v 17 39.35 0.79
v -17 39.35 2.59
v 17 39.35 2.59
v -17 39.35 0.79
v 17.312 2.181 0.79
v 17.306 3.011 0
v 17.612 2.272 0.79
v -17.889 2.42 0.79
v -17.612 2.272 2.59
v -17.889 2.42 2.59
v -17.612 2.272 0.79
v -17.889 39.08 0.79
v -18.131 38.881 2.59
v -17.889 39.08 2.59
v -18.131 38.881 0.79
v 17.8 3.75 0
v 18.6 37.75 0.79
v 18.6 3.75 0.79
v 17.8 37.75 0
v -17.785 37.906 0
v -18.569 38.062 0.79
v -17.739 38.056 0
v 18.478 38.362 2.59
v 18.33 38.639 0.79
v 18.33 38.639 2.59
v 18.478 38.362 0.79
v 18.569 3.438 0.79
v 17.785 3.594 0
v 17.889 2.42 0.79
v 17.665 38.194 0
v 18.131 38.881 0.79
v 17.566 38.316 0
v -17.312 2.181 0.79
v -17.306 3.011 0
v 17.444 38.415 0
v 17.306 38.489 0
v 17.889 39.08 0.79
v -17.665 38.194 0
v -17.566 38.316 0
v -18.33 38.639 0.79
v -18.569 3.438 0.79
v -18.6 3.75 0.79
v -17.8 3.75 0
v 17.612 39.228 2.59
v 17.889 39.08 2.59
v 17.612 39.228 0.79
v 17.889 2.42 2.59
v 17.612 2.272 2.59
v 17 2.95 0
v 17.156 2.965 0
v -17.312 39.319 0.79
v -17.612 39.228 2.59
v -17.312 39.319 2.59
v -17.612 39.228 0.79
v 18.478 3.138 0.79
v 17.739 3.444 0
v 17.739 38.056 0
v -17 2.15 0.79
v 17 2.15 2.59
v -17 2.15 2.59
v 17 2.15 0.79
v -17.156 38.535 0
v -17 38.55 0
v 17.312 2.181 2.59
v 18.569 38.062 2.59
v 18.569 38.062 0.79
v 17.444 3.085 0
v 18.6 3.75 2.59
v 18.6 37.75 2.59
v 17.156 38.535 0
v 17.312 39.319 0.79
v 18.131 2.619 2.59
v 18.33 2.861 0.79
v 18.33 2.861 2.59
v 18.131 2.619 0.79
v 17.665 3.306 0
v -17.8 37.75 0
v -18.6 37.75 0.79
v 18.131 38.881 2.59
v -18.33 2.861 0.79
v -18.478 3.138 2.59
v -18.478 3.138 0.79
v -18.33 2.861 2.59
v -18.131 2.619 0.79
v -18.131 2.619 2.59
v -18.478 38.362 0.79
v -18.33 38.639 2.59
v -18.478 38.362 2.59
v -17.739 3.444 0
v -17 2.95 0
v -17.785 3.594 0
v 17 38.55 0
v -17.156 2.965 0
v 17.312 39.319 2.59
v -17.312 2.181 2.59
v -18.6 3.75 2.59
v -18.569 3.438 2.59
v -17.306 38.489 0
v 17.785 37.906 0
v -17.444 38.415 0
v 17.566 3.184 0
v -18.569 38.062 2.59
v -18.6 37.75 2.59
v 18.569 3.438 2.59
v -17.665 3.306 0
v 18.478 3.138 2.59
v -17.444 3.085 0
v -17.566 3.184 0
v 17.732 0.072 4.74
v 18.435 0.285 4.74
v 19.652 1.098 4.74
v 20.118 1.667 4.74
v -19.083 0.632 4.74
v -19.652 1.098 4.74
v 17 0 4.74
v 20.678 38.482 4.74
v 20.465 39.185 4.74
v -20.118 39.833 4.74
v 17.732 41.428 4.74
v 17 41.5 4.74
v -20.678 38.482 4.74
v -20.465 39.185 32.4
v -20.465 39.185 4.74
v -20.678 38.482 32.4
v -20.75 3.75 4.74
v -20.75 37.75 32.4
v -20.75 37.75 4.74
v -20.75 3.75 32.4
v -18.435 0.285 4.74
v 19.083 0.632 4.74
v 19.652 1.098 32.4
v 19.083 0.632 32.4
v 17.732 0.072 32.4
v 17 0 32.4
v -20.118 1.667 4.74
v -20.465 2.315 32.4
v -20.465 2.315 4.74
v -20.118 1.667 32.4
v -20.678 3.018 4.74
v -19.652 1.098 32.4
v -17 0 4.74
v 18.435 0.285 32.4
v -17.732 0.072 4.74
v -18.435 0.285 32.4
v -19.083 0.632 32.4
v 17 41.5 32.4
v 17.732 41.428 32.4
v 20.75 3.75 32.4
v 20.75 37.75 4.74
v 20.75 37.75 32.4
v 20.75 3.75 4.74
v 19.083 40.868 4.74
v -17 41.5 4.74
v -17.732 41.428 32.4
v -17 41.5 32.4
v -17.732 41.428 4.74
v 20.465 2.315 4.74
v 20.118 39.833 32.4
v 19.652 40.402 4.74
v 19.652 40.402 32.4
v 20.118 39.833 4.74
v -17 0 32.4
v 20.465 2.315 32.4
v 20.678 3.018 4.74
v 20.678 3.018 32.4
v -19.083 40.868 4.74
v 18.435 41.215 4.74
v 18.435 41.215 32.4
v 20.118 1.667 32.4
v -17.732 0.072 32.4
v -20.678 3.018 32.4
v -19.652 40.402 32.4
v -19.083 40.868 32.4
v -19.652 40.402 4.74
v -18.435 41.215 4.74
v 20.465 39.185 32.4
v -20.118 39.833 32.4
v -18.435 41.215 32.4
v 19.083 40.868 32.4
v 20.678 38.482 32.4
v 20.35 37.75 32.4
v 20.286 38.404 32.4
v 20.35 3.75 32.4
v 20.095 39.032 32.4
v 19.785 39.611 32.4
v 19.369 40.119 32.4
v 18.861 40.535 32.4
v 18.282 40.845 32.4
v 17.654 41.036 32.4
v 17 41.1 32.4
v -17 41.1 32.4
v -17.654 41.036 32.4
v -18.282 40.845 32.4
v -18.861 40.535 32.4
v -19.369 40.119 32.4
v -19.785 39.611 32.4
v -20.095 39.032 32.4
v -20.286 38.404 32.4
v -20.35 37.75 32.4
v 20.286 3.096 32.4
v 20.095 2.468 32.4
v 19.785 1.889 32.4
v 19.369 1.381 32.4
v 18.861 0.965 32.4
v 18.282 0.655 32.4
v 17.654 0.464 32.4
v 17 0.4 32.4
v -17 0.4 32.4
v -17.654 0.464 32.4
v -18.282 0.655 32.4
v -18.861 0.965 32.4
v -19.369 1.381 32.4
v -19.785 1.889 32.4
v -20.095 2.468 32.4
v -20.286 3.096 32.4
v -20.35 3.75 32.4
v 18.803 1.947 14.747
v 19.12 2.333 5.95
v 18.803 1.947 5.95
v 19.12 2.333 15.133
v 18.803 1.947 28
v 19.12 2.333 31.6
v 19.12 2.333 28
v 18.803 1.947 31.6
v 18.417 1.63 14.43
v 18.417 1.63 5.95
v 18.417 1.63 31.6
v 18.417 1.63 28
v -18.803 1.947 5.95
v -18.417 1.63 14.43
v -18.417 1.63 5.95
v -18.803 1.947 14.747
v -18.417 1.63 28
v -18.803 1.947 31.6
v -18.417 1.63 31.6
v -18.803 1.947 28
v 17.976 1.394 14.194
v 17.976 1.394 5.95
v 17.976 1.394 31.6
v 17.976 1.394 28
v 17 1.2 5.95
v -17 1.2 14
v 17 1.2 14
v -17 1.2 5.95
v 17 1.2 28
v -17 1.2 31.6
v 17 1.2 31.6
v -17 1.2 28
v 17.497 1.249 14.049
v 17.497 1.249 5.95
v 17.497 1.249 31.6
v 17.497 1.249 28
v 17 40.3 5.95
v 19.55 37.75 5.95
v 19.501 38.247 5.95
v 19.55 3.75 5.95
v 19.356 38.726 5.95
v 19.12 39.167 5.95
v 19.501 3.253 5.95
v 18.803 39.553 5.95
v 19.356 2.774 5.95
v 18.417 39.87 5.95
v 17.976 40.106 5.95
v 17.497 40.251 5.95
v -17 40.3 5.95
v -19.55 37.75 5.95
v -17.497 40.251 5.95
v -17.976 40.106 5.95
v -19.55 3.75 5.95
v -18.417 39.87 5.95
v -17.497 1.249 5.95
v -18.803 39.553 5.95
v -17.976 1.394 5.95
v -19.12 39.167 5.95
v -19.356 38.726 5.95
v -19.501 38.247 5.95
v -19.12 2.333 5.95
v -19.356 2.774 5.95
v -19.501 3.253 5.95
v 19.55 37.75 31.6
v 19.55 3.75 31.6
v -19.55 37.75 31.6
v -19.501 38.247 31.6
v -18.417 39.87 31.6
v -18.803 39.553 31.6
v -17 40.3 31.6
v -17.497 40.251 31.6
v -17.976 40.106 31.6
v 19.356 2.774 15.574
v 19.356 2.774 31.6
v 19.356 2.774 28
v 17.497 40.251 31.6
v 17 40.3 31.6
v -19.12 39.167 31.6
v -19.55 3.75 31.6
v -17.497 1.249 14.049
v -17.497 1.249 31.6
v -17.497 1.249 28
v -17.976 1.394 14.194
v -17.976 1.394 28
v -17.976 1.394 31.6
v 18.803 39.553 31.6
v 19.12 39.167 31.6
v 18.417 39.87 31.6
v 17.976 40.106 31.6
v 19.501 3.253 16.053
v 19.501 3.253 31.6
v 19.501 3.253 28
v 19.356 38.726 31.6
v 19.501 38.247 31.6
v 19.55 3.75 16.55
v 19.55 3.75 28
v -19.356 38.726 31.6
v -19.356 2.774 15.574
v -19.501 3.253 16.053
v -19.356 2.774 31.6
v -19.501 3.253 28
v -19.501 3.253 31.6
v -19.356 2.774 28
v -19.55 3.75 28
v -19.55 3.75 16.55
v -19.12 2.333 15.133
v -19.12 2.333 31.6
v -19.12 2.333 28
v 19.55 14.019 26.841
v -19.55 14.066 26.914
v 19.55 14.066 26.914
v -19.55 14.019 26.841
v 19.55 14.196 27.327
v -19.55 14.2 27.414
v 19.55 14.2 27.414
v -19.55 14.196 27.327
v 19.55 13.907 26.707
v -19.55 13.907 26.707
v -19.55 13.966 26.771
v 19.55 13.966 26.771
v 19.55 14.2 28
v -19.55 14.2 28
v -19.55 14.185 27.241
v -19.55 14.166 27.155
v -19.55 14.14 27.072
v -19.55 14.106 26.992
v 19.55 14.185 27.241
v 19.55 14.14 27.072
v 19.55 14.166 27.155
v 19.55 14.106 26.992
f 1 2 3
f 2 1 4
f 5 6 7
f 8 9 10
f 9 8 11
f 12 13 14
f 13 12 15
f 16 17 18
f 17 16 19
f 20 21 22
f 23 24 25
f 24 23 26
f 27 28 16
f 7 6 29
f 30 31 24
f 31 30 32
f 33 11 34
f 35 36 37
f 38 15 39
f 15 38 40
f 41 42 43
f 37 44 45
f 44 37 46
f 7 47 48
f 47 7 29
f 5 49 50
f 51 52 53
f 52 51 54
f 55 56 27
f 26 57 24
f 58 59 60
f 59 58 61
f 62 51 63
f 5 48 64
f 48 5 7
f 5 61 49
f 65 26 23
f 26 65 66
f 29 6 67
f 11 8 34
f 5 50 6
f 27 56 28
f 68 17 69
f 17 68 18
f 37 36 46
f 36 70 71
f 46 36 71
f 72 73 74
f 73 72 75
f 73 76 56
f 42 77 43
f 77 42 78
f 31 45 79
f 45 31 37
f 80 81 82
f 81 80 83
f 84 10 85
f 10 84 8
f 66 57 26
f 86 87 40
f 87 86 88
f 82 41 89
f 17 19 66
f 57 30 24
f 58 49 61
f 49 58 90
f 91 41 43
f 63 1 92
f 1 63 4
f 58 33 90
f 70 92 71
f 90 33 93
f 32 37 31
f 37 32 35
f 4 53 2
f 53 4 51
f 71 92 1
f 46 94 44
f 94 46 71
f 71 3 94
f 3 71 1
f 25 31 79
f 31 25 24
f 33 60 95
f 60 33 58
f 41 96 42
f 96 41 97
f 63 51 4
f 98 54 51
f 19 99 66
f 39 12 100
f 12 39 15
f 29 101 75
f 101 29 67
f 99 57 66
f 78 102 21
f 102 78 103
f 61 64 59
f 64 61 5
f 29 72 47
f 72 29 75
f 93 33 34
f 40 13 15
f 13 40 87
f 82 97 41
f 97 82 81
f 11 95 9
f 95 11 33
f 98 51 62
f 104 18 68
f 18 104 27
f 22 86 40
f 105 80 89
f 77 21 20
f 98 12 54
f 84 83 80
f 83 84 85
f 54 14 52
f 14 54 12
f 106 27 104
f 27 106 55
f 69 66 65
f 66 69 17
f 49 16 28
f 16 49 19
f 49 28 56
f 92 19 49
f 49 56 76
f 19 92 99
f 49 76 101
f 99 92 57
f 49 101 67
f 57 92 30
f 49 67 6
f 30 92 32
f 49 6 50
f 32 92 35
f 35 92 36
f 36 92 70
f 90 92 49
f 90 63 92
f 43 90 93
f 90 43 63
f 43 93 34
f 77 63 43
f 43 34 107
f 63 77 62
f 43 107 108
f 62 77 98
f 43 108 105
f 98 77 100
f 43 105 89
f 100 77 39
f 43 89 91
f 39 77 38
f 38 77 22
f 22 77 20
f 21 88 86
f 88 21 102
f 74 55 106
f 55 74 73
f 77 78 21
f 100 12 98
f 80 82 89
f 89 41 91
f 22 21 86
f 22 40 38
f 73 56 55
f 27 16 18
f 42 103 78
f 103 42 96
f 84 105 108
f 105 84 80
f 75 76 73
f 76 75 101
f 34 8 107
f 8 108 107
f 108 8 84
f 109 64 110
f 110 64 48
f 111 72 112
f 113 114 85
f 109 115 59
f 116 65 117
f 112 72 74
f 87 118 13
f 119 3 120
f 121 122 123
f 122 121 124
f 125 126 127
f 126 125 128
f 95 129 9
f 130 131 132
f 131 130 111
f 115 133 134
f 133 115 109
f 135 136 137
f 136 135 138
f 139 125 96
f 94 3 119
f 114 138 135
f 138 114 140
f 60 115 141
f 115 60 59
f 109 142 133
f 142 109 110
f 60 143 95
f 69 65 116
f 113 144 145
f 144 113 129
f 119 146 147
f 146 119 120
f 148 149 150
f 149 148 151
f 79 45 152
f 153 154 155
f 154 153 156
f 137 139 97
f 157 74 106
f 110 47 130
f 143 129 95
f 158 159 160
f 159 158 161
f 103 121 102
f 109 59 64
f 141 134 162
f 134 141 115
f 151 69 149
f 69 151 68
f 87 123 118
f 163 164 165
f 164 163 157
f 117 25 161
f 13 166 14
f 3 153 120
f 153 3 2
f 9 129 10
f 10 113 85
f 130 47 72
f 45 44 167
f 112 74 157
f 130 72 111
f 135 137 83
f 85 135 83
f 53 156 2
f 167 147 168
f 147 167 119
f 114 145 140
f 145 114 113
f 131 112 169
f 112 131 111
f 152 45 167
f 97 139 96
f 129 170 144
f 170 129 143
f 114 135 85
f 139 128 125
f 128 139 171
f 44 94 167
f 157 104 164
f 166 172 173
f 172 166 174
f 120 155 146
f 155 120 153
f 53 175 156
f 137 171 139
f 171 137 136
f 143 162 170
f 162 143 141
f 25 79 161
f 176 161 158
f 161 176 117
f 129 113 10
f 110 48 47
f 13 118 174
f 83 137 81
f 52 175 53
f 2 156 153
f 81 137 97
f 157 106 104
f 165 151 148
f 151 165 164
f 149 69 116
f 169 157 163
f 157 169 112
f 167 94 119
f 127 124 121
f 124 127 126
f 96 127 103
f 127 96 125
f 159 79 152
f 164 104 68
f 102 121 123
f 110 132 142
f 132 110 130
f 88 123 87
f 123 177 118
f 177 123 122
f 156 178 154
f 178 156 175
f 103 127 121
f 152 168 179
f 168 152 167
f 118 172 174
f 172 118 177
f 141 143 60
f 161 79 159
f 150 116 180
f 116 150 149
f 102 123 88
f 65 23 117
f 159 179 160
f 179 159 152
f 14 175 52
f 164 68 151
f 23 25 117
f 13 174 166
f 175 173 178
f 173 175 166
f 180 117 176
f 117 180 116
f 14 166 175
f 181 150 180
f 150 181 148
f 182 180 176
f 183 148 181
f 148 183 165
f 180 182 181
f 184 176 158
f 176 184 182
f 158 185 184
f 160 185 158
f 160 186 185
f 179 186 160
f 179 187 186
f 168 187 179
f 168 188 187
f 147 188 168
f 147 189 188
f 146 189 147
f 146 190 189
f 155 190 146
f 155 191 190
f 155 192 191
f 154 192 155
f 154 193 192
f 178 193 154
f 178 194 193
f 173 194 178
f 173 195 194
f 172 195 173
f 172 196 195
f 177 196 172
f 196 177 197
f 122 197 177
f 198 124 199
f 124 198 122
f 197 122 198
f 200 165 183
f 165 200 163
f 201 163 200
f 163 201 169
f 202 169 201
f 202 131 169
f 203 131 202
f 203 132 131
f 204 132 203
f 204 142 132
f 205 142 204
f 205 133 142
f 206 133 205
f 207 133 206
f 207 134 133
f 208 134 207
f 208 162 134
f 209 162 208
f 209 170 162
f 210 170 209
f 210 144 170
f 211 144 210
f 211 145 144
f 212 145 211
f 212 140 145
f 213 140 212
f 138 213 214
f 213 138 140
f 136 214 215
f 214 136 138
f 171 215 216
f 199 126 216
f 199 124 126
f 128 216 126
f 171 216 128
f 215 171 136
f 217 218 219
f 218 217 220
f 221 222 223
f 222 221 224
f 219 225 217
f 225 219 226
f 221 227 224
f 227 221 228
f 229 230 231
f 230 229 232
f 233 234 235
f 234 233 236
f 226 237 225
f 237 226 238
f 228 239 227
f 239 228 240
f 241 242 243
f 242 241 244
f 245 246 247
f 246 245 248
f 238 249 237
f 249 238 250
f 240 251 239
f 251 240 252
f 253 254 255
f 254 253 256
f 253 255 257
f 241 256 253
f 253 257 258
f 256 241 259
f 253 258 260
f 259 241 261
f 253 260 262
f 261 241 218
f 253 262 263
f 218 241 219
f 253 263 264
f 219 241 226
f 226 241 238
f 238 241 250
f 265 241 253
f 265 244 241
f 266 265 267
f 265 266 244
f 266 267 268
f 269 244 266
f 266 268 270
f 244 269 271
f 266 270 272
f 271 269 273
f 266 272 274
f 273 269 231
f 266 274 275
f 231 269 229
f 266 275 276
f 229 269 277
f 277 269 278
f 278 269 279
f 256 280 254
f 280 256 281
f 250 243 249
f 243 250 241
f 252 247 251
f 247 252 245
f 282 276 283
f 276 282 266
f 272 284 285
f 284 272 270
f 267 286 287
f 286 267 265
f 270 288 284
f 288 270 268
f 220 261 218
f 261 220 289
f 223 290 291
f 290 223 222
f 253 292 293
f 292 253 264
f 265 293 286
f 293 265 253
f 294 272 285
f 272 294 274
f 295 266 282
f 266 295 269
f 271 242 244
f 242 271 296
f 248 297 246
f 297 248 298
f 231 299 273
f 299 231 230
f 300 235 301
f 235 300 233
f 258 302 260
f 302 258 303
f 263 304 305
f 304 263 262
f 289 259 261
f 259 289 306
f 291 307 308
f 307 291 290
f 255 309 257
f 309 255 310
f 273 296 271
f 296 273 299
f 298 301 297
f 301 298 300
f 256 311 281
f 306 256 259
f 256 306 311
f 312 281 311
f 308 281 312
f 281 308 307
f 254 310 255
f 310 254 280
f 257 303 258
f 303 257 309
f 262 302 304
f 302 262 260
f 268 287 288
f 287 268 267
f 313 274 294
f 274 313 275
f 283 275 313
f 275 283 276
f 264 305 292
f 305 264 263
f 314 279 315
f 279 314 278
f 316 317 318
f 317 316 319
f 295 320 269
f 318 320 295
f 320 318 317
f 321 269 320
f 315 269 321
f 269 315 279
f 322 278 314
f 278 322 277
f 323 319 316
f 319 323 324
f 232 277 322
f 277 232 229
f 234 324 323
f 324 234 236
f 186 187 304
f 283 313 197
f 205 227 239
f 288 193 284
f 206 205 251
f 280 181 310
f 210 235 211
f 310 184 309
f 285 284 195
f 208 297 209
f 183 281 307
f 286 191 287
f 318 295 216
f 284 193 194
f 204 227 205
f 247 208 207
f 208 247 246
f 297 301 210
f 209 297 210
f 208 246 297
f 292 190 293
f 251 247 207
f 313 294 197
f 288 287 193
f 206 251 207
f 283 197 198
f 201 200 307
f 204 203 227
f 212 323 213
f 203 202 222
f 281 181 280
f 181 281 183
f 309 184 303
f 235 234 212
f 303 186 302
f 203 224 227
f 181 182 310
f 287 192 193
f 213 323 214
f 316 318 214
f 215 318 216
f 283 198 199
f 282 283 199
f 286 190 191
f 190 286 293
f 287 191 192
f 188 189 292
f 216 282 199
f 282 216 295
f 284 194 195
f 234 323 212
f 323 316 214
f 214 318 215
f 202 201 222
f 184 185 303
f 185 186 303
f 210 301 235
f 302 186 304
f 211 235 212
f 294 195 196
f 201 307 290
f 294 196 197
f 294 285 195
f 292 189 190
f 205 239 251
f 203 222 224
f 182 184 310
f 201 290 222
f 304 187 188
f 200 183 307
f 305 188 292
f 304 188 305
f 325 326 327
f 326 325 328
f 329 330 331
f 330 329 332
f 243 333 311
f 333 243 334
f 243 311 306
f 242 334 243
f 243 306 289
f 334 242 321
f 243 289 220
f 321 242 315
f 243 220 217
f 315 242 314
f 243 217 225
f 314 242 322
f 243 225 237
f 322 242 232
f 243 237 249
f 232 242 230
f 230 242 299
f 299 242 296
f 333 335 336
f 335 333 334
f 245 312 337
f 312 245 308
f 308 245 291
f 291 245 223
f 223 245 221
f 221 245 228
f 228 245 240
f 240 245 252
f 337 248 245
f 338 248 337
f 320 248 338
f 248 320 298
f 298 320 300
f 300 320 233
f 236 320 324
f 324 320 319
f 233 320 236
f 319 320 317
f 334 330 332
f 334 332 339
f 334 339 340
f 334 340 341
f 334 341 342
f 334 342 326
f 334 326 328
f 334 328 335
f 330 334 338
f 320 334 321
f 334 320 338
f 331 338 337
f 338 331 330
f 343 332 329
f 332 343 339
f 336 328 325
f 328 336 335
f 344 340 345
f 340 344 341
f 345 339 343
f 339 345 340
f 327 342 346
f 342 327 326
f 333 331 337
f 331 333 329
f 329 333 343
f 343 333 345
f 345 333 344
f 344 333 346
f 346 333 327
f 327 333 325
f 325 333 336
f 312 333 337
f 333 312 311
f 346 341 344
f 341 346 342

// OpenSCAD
// file: ../../modules/gridfinity.scad
// Gridfinity ベースプレートの共有 module。
// 寸法は Gridfinity 仕様 (Zack Freedman) の baseplate 輪郭に従う:
//   ピッチ 42、ソケット上端開口 41.5 (角 R4)、上から 45° 面取り 2.15 →
//   垂直 1.8 (37.2 角・R1.85) → 45° 面取り 0.7 → 底 35.8 角 (R1.15)。
//   ソケット深さ = 2.15 + 1.8 + 0.7 = 4.65。
//
// 座標系: X が列方向 (中央が 0)、Y が行方向 (板の前端が 0)、Z=0 が板の底面。
// 板の外形は grid とは独立に rim で与えるので、grid より大きい板 (縁付き) を
// 作れる。ソケットは rim=[left, right, front, back] の内側へ 42 ピッチで並ぶ。

gf_pitch = 42;
gf_socket_top = 41.5; // 上端開口
gf_socket_mid = 37.2; // 垂直部
gf_socket_bot = 35.8; // 底
gf_socket_r_top = 4;
gf_socket_r_mid = 1.85;
gf_socket_r_bot = 1.15;
gf_chamfer_top = 2.15;
gf_wall_h = 1.8;
gf_chamfer_bot = 0.7;
gf_socket_depth = gf_chamfer_top + gf_wall_h + gf_chamfer_bot; // 4.65
gf_fn = 32;
gf_eps = 0.01; // hull 用の薄板の厚さ
gf_over = 0.5; // 切削の抜き代

// 角丸正方形 (一辺 w、角 R)
module
gf_rounded_square(w, r)
{
    offset(r = r, $fn = gf_fn) square(w - 2 * r, center = true);
}

// 厚さ gf_eps の角丸正方形の薄板を z に置く (hull の骨)
module
gf_slab(w, r, z)
{
    translate([ 0, 0, z ]) linear_extrude(gf_eps) gf_rounded_square(w, r);
}

// ソケット1個の切削体。z=0 がソケットの底 (床の天面)、+Z へ 4.65 で天面に出る。
// clearance は嵌合の逃げで、輪郭を全周へ clearance だけ外へ出す (幅 +2c、角 R
// +c)。 既定 0 が Gridfinity の公称輪郭。深さとピッチは変えない
module
gf_socket_cut(clearance = 0)
{
    z1 = gf_chamfer_bot;
    z2 = z1 + gf_wall_h;
    z3 = gf_socket_depth;
    c = clearance;
    hull()
    {
        gf_slab(gf_socket_bot + 2 * c, gf_socket_r_bot + c, 0);
        gf_slab(gf_socket_mid + 2 * c, gf_socket_r_mid + c, z1 - gf_eps);
    }
    hull()
    {
        gf_slab(gf_socket_mid + 2 * c, gf_socket_r_mid + c, z1 - gf_eps);
        gf_slab(gf_socket_mid + 2 * c, gf_socket_r_mid + c, z2 - gf_eps);
    }
    hull()
    {
        gf_slab(gf_socket_mid + 2 * c, gf_socket_r_mid + c, z2 - gf_eps);
        gf_slab(gf_socket_top + 2 * c, gf_socket_r_top + c, z3 - gf_eps);
    }
    // 天面より上へ抜く (天面と同一平面の退化した面を残さない)
    gf_slab(gf_socket_top + 2 * c, gf_socket_r_top + c, z3 - gf_eps);
    translate([ 0, 0, z3 - gf_eps ]) linear_extrude(gf_over + gf_eps)
        gf_rounded_square(gf_socket_top + 2 * c, gf_socket_r_top + c);
}

// ベースプレート。cols x rows のソケットを床 floor_t の上に彫る。
// rim = [left, right, front, back] はソケット列の外側に残す縁の幅。
// 板の幅 = cols*42 + left + right、奥行き = rows*42 + front + back。
// clearance はソケットの嵌合の逃げ (gf_socket_cut を参照)。
module
gf_baseplate(cols, rows, rim = [ 0, 0, 0, 0 ], floor_t = 1, clearance = 0)
{
    grid_w = cols * gf_pitch;
    grid_d = rows * gf_pitch;
    plate_w = grid_w + rim[0] + rim[1];
    plate_d = grid_d + rim[2] + rim[3];
    x0 = -plate_w / 2 + rim[0]; // ソケット列の左端
    difference()
    {
        translate([ -plate_w / 2, 0, 0 ])
            cube([ plate_w, plate_d, floor_t + gf_socket_depth ]);
        for (c = [0:cols - 1], r = [0:rows - 1])
            translate([
                x0 + (c + 0.5) * gf_pitch,
                rim[2] + (r + 0.5) * gf_pitch,
                floor_t
            ]) gf_socket_cut(clearance);
    }
}
// file: ../../modules/gridfinity_bin.scad
include <gridfinity.scad>

// Gridfinity bin (箱) の共有 module。ピッチと角丸は gridfinity.scad
// と共有する。 底の輪郭は Gridfinity 仕様の bin base (下から):
//   35.6 角 (R0.8) → 45° 0.8 → 37.2 角 (R1.6) → 垂直 1.8 → 45° 2.15 → 41.5 角
//   (R3.75) 高さ 0.8 + 1.8 + 2.15 = 4.75。磁石穴・ネジ穴は持たない (無垢)
// 外形はピッチ − 0.5 (1 マス 41.5)、角 R3.75。高さ単位 7 (4U = 28 が壁の上端)。
// リップは「薄いリップ」: 壁 (1.2) をそのまま lip_h (4.4) 伸ばし、内側の上端を
// 45° に落とすだけ。内側に棚 (厚い肉) を持たないので、上に載せる bin は底の
// 面取りをこの 45° に座らせる。
//
// 座標系: X が列方向 (中央 0)、Y が行方向 (手前 = ラベル側が 0)、Z=0 が底面。

gfb_outer = gf_pitch - 0.5; // 41.5
gfb_outer_r = 3.75;
gfb_base_bot = 35.6;
gfb_base_bot_r = 0.8;
gfb_base_mid = 37.2;
gfb_base_mid_r = 1.6;
gfb_base_chamfer_bot = 0.8;
gfb_base_wall_h = 1.8;
gfb_base_chamfer_top = 2.15;
gfb_base_h =
    gfb_base_chamfer_bot + gfb_base_wall_h + gfb_base_chamfer_top; // 4.75
gfb_unit = 7;
gfb_lip_h = 4.4;
gfb_lip_chamfer = 0.8;

// bin 1 マスぶんの底 (無垢)。z=0 が底面、gfb_base_h で外形 41.5 角に達する
module
gfb_base_cell()
{
    z1 = gfb_base_chamfer_bot;
    z2 = z1 + gfb_base_wall_h;
    z3 = gfb_base_h;
    hull()
    {
        gf_slab(gfb_base_bot, gfb_base_bot_r, 0);
        gf_slab(gfb_base_mid, gfb_base_mid_r, z1 - gf_eps);
    }
    hull()
    {
        gf_slab(gfb_base_mid, gfb_base_mid_r, z1 - gf_eps);
        gf_slab(gfb_base_mid, gfb_base_mid_r, z2 - gf_eps);
    }
    hull()
    {
        gf_slab(gfb_base_mid, gfb_base_mid_r, z2 - gf_eps);
        gf_slab(gfb_outer, gfb_outer_r, z3 - gf_eps);
    }
}

// cols x rows の角丸矩形 (外形)
module
gfb_footprint(cols, rows, inset = 0)
{
    w = cols * gf_pitch - 0.5 - 2 * inset;
    d = rows * gf_pitch - 0.5 - 2 * inset;
    translate([ 0, d / 2 + inset ])
        gf_rounded_square_wd(w, d, gfb_outer_r - inset);
}

// 幅 w × 奥行き d の角丸矩形 (中心が原点)
module
gf_rounded_square_wd(w, d, r)
{
    offset(r = r, $fn = gf_fn) square([ w - 2 * r, d - 2 * r ], center = true);
}

// ラベル天板の Y-Z 断面 (y = 壁の内面からの距離、z = 高さ)。天板 (厚さ t) の
// 先端から 45° の斜面が壁まで下りる無垢のくさび。先端の垂直面と斜面の境目
// (135°) を半径 r で丸める: 円弧の中心は先端の角から (-r, r·tan22.5°)、接点は
// 垂直面上の角 + (0, r·tan22.5°) と斜面上の角 + 0.4142r·(-1,-1)。壁の内側へ
// 1 だけ食い込ませて胴体と溶かす
function gfb_label_profile(d, t, h, r) =
    let(y0 = d, z0 = h - t, cy = y0 - r, cz = z0 + r * tan(22.5))
        concat([ [ -1, h ], [ d, h ] ],
               [for (a = [0:-5:-45])[cy + r * cos(a), cz + r* sin(a)]],
               [[ -1, h - t - d - 1 ]]);

// bin 本体。units は高さ (U)。wall / floor_t は壁と床の厚さ。
// label_d > 0 なら手前 (y=0) の壁の上端 (z = units*7) と面一で内側へ label_d
// 張り出す厚さ label_t のラベル天板を付ける。天板の下は 45° の無垢のくさびが
// 壁まで下りる (ブリッジもリブも無い。中身はスライサのインフィル任せ)。
// 天板の先端と 45° 面の境目は半径 label_r で丸める
module
gfb_bin(cols,
        rows,
        units = 4,
        wall = 1.2,
        floor_t = 1.2,
        label_d = 0,
        label_t = 1,
        label_r = 1)
{
    h = units * gfb_unit; // 壁の上端
    top = h + gfb_lip_h;  // リップの上端
    inner_w = cols * gf_pitch - 0.5 - 2 * wall;
    floor_top = gfb_base_h + floor_t;
    union()
    {
        // 底: マスごとの無垢の base
        for (c = [0:cols - 1], r = [0:rows - 1])
            translate([
                (c - (cols - 1) / 2) * gf_pitch,
                (r + 0.5) * gf_pitch - 0.25,
                0
            ]) gfb_base_cell();
        // 胴体: base の上から top
        // まで。内側は床の上を抜く。リップの内側の上端は 45°
        difference()
        {
            translate([ 0, 0, gfb_base_h - gf_eps ])
                linear_extrude(top - gfb_base_h + gf_eps)
                    gfb_footprint(cols, rows);
            translate([ 0, 0, floor_top ])
                linear_extrude(top - floor_top + gf_over)
                    gfb_footprint(cols, rows, wall);
            // リップ内側の面取り: 上端で wall − 0.4 まで開く
            hull()
            {
                translate([ 0, 0, top - gfb_lip_chamfer ])
                    linear_extrude(gf_eps) gfb_footprint(cols, rows, wall);
                translate([ 0, 0, top ]) linear_extrude(gf_over)
                    gfb_footprint(cols, rows, wall - gfb_lip_chamfer);
            }
        }
        // ラベル天板と 45° くさび (内幅いっぱい、同じ断面)。壁へ 1 食い込ませた
        // 矩形の柱なので、角の丸み (R3.75) の外へ出ないよう外形で切り取る
        if (label_d > 0)
            intersection()
            {
                translate([ -inner_w / 2, wall, 0 ]) rotate([ 90, 0, 90 ])
                    linear_extrude(inner_w) polygon(
                        gfb_label_profile(label_d, label_t, h, label_r));
                linear_extrude(top) gfb_footprint(cols, rows);
            }
    }
}
// file: ../../modules/gridfinity_bin_4u.scad
include <gridfinity_bin.scad>

// assets/gridfinity-bin/ の bin 群の共通値と、サイズ 3 引数の払い出し口。
// 単体では何も描かない。設計の経緯と確定値は
// ledger/designs/gridfinity-bin-4u.md が正本。 保証する範囲は cols 1..2 ×
// rows 1..5 × units 4 (assets に並ぶ 10 種)。 cols が X (横)、rows が Y
// (ラベルの壁から奥へ)、units が高さ (7mm 単位)。
wall = 1.2;    // 0.4 ノズル 3 本
floor_t = 1.2; // 底 (4.75) の上に載せる床。床の天面 z = 5.95
label_d = 13;  // 12mm 幅のラベルシールを貼る天板の張り出し
label_t = 1; // 天板の厚さ (user 指定)。下は 45° の無垢のくさび
label_r = 1; // 天板の先端と 45° 面の境目の R (user 指定)

function bin_contract(cols, rows, units) = str("CONTRACT units=",
                                               units,
                                               " pitch=",
                                               gf_pitch,
                                               " outer=",
                                               gfb_outer,
                                               " h=",
                                               units* gfb_unit,
                                               " lip=",
                                               gfb_lip_h,
                                               " base=",
                                               gfb_base_bot,
                                               "/",
                                               gfb_base_mid,
                                               "/",
                                               gfb_outer,
                                               " base_h=",
                                               gfb_base_h,
                                               " wall=",
                                               wall,
                                               " floor_top=",
                                               gfb_base_h + floor_t,
                                               " label=",
                                               label_d,
                                               "x",
                                               label_t,
                                               " wedge=45 fillet=",
                                               label_r,
                                               " bin=",
                                               cols,
                                               "x",
                                               rows,
                                               " size=",
                                               cols* gf_pitch - 0.5,
                                               "x",
                                               rows* gf_pitch - 0.5);

// (cols, rows, units) でラベル付き bin を払い出す。例: gridfinity_bin(2, 4, 4)
module
gridfinity_bin(cols, rows, units = 4)
{
    echo(bin_contract(cols, rows, units));
    gfb_bin(cols, rows, units, wall, floor_t, label_d, label_t, label_r);
}
// main file
include <../../modules/gridfinity_bin_4u.scad>

// 1x1 マス、高さ 4U のラベル天板付き bin。ラベルは手前 (y=0) 側
gridfinity_bin(1, 1, 4);
